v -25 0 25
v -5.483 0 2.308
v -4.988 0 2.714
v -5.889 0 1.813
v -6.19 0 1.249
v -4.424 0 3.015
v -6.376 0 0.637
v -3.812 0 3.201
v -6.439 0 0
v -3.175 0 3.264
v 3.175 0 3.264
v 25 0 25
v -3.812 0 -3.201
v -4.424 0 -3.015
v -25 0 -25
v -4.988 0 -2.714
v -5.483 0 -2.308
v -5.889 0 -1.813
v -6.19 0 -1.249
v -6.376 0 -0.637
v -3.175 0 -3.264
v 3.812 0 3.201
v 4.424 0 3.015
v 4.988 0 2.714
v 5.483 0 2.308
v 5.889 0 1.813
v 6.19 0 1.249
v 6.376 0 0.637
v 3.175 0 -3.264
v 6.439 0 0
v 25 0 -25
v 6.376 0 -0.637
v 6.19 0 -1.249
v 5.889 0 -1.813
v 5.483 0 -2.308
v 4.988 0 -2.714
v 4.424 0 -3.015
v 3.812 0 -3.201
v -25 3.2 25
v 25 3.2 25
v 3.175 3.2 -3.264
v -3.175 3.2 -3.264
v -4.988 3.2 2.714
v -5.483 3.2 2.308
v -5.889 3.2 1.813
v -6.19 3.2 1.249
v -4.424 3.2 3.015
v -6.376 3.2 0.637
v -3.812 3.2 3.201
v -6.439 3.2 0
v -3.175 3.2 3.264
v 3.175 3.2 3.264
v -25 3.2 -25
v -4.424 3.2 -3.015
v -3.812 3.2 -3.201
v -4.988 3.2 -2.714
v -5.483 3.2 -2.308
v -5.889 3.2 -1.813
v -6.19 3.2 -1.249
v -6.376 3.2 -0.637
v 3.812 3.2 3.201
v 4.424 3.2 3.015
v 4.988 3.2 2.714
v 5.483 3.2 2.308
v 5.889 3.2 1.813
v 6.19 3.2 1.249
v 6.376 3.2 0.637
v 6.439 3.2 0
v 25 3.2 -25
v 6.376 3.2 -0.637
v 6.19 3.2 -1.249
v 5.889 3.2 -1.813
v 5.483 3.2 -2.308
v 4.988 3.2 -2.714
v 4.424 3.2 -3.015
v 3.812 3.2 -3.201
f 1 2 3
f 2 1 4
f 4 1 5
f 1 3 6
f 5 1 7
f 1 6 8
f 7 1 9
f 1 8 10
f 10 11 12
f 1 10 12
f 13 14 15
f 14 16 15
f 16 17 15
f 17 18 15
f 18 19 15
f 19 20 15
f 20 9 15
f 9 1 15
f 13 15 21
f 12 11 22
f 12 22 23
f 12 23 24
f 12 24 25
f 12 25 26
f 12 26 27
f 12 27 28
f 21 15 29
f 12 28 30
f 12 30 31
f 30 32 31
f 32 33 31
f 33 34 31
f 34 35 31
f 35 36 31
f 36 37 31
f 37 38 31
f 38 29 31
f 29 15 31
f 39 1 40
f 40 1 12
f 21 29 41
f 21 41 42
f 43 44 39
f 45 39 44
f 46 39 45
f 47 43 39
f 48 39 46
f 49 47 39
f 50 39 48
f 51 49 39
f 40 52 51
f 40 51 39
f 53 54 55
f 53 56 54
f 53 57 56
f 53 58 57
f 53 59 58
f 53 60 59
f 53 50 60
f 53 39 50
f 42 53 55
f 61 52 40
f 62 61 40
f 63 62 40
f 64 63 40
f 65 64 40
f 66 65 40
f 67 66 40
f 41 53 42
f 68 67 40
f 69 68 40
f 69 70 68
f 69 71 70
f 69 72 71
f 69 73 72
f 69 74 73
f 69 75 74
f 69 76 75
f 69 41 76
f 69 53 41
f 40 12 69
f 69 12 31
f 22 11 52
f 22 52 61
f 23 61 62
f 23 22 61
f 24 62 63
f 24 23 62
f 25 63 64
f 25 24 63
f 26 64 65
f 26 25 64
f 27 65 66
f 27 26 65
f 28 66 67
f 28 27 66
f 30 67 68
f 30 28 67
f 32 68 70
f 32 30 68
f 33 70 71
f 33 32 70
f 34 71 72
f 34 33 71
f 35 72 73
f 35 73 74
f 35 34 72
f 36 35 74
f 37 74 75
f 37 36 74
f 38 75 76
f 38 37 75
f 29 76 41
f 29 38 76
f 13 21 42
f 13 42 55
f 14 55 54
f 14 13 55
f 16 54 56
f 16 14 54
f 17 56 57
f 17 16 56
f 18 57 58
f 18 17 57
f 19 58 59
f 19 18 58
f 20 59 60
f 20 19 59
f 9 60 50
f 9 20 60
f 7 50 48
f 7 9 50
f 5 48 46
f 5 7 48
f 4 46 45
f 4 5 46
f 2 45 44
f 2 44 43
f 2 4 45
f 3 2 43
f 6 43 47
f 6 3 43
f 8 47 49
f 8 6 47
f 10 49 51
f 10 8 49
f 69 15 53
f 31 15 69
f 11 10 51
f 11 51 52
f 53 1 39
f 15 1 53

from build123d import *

# Parameters (mm, degrees)
SKETCH1_W                   = 50
SKETCH1_H                   = 50
BOSS_EXTRUDE1_DEPTH         = 3.2
F_1_4_CLEARANCE_SLOT2_DEPTH = 3.2


# Read off the part's stored shape, not the designer's step: 1/4 Clearance Slot2
with BuildPart() as part:
    # Sketch1 → Boss-Extrude1 (new body)
    with BuildSketch(Plane(origin=(0, 0, 0), x_dir=(1, 0, 0), z_dir=(0, 1, 0))):
        Rectangle(SKETCH1_W, SKETCH1_H)
    extrude(amount=BOSS_EXTRUDE1_DEPTH)

    # 1/4 Clearance Slot2 outline → 1/4 Clearance Slot2 (cut)
    with BuildSketch(Plane(origin=(0, 0, 0), x_dir=(1, 0, 0), z_dir=(0, 1, 0))):
        with BuildLine():
            Line((-3.175, -3.2639), (3.175, -3.2639))
            ThreePointArc((3.175, -3.2639), (6.4389, 0), (3.175, 3.2639))
            Line((3.175, 3.2639), (-3.175, 3.2639))
            ThreePointArc((-3.175, 3.2639), (-6.4389, 0), (-3.175, -3.2639))
        make_face()
    extrude(amount=F_1_4_CLEARANCE_SLOT2_DEPTH, mode=Mode.SUBTRACT)


solid = part.part
